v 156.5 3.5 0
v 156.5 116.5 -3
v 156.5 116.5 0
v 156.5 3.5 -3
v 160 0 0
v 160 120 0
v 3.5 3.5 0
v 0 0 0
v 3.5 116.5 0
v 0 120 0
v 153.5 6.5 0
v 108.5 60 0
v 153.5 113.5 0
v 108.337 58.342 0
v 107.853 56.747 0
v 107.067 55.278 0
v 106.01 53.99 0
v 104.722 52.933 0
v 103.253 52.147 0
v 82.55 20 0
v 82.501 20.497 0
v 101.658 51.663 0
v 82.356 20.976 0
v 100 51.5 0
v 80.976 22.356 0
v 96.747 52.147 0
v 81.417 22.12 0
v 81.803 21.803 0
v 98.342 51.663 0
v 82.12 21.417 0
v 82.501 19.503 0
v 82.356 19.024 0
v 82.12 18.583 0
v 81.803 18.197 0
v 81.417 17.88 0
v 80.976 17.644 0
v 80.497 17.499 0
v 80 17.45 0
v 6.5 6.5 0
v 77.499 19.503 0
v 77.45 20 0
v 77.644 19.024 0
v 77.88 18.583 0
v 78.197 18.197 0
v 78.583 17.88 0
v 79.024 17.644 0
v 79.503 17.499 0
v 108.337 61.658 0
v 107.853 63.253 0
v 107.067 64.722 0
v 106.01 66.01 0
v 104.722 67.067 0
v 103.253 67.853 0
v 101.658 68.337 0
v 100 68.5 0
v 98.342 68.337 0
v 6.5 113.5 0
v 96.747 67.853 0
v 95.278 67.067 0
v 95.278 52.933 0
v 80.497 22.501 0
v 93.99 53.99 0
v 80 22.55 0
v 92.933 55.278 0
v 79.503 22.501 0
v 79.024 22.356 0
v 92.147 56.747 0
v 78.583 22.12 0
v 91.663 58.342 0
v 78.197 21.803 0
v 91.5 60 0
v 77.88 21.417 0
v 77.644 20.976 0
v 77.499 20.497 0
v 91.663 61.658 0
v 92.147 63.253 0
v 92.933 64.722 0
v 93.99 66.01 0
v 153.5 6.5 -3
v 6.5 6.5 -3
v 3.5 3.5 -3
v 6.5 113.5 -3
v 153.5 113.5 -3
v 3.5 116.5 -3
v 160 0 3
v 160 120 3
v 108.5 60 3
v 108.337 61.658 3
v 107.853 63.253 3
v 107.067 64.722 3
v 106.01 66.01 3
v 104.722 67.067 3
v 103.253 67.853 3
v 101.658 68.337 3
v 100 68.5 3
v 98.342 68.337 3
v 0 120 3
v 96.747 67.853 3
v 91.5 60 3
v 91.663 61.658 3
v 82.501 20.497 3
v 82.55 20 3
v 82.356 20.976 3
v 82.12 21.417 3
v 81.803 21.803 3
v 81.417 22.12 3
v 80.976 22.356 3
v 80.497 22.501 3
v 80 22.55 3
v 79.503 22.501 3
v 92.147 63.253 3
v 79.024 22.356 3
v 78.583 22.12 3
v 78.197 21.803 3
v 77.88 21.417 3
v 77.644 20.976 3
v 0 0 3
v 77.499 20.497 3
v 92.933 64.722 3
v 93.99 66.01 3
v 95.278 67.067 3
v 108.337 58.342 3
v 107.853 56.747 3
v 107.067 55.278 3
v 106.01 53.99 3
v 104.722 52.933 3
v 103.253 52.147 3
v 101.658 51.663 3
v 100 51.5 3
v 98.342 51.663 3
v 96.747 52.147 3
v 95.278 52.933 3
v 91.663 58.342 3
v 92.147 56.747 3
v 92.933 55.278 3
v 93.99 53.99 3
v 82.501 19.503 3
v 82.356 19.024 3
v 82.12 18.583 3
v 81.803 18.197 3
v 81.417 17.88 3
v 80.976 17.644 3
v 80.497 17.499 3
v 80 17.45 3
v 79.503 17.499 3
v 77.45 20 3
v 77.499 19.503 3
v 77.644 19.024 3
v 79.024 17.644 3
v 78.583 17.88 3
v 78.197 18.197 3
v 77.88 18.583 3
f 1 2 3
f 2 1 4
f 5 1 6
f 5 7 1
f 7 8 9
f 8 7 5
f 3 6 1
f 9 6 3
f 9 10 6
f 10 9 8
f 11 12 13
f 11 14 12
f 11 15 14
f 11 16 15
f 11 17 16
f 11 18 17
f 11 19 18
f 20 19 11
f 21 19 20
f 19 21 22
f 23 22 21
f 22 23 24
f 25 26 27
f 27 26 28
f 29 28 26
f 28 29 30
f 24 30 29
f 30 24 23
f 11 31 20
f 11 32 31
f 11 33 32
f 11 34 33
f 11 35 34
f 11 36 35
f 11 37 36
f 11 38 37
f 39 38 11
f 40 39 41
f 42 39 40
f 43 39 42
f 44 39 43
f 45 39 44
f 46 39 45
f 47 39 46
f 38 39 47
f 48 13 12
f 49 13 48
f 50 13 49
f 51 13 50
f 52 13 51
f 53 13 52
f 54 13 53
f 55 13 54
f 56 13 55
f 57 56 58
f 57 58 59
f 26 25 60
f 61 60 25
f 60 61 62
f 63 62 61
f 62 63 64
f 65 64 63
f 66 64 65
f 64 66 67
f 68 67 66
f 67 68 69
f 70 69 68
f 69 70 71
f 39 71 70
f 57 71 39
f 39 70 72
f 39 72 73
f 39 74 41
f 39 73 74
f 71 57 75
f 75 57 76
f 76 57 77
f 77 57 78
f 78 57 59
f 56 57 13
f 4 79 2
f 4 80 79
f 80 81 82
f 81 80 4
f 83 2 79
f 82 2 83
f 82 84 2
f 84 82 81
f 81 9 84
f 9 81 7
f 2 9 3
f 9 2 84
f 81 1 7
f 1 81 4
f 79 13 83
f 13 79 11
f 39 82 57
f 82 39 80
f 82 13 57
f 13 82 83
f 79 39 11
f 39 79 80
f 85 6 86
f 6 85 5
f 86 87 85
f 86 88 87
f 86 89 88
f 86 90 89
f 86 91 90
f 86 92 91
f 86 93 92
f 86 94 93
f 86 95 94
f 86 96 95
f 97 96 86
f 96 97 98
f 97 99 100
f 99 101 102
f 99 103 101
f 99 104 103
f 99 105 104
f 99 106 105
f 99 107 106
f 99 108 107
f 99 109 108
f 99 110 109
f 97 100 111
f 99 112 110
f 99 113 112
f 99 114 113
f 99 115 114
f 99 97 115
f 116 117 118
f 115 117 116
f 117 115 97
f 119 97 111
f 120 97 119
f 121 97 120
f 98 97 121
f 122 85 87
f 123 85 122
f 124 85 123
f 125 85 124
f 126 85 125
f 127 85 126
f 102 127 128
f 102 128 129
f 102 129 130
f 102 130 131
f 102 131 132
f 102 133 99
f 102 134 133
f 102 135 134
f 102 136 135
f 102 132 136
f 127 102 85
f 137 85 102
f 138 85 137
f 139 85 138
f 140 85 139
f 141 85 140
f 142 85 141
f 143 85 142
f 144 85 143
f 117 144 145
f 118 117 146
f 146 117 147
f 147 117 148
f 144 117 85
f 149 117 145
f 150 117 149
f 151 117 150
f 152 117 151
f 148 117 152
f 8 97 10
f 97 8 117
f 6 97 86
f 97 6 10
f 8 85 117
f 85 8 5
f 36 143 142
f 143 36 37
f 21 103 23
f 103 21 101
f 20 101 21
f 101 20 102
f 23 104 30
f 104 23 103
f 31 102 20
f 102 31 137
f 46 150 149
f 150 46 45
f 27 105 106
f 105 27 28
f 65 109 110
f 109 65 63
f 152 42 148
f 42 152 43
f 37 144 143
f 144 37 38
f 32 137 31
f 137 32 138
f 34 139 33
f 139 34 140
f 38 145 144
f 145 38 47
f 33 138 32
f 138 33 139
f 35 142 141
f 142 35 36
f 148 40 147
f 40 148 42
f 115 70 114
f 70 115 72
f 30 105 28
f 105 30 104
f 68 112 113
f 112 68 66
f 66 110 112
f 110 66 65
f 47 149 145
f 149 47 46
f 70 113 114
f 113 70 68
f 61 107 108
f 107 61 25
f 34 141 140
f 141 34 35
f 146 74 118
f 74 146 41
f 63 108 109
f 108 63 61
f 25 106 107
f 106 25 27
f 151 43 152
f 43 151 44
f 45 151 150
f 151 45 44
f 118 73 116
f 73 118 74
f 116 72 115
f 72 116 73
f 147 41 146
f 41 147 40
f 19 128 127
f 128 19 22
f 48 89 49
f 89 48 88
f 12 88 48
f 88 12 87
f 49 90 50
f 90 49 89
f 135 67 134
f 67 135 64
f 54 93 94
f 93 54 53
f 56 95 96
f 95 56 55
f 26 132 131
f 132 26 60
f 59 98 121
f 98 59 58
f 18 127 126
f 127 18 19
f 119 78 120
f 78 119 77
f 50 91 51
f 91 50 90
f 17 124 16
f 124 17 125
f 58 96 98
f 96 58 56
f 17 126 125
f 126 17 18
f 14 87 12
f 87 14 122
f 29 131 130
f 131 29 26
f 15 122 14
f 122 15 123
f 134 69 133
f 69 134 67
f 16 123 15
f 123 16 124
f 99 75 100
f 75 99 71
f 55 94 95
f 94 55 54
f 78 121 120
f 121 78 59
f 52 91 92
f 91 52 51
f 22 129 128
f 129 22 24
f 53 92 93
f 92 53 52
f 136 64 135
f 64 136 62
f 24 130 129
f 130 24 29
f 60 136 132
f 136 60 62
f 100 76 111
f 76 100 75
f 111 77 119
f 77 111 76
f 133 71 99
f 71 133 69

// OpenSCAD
// --- GLOBAL PARAMETERS ---
$fn = 32;
box_w = 160;
box_d = 120;
box_h = 110; // Tall enough to clear the 100mm rod
wall = 3;

// Placement coordinates
arduino_pos = [10, 10];
mech_center = [100, 60];
mesh_dist = 13.5; 

// --- TOGGLE VIEW ---
// Set to 1 for Box, 2 for Lid, 3 for Both (Exploded)
view_mode = 2; 

if (view_mode == 1 || view_mode == 3) main_box();
if (view_mode == 2) lid();
if (view_mode == 3) translate([0, 0, box_h + 20]) lid();


module lid() {
    difference() {
        union() {
            // Main flat lid
            cube([box_w, box_d, wall]);
            // Lip to keep it from sliding
            translate([wall+0.5, wall+0.5, -wall])
                difference() {
                    cube([box_w-wall*2-1, box_d-wall*2-1, wall]);
                    translate([wall, wall, -1]) 
                        cube([box_w-wall*4-1, box_d-wall*4-1, wall+2]);
                }
        }
        
        // 1. LED HOLE (Top Center)
        translate([box_w/2, 20, -1]) 
            cylinder(h=wall+2, r=2.55); // 5.1mm hole for 5mm LED
            
        // 2. GEAR ROD TOP SUPPORT HOLE
        // This acts as a "bushing" to keep the rod vertical
        translate([mech_center[0], mech_center[1], -1])
            cylinder(h=wall+2, r=8.5); // Slightly larger than gear radius
    }
}
